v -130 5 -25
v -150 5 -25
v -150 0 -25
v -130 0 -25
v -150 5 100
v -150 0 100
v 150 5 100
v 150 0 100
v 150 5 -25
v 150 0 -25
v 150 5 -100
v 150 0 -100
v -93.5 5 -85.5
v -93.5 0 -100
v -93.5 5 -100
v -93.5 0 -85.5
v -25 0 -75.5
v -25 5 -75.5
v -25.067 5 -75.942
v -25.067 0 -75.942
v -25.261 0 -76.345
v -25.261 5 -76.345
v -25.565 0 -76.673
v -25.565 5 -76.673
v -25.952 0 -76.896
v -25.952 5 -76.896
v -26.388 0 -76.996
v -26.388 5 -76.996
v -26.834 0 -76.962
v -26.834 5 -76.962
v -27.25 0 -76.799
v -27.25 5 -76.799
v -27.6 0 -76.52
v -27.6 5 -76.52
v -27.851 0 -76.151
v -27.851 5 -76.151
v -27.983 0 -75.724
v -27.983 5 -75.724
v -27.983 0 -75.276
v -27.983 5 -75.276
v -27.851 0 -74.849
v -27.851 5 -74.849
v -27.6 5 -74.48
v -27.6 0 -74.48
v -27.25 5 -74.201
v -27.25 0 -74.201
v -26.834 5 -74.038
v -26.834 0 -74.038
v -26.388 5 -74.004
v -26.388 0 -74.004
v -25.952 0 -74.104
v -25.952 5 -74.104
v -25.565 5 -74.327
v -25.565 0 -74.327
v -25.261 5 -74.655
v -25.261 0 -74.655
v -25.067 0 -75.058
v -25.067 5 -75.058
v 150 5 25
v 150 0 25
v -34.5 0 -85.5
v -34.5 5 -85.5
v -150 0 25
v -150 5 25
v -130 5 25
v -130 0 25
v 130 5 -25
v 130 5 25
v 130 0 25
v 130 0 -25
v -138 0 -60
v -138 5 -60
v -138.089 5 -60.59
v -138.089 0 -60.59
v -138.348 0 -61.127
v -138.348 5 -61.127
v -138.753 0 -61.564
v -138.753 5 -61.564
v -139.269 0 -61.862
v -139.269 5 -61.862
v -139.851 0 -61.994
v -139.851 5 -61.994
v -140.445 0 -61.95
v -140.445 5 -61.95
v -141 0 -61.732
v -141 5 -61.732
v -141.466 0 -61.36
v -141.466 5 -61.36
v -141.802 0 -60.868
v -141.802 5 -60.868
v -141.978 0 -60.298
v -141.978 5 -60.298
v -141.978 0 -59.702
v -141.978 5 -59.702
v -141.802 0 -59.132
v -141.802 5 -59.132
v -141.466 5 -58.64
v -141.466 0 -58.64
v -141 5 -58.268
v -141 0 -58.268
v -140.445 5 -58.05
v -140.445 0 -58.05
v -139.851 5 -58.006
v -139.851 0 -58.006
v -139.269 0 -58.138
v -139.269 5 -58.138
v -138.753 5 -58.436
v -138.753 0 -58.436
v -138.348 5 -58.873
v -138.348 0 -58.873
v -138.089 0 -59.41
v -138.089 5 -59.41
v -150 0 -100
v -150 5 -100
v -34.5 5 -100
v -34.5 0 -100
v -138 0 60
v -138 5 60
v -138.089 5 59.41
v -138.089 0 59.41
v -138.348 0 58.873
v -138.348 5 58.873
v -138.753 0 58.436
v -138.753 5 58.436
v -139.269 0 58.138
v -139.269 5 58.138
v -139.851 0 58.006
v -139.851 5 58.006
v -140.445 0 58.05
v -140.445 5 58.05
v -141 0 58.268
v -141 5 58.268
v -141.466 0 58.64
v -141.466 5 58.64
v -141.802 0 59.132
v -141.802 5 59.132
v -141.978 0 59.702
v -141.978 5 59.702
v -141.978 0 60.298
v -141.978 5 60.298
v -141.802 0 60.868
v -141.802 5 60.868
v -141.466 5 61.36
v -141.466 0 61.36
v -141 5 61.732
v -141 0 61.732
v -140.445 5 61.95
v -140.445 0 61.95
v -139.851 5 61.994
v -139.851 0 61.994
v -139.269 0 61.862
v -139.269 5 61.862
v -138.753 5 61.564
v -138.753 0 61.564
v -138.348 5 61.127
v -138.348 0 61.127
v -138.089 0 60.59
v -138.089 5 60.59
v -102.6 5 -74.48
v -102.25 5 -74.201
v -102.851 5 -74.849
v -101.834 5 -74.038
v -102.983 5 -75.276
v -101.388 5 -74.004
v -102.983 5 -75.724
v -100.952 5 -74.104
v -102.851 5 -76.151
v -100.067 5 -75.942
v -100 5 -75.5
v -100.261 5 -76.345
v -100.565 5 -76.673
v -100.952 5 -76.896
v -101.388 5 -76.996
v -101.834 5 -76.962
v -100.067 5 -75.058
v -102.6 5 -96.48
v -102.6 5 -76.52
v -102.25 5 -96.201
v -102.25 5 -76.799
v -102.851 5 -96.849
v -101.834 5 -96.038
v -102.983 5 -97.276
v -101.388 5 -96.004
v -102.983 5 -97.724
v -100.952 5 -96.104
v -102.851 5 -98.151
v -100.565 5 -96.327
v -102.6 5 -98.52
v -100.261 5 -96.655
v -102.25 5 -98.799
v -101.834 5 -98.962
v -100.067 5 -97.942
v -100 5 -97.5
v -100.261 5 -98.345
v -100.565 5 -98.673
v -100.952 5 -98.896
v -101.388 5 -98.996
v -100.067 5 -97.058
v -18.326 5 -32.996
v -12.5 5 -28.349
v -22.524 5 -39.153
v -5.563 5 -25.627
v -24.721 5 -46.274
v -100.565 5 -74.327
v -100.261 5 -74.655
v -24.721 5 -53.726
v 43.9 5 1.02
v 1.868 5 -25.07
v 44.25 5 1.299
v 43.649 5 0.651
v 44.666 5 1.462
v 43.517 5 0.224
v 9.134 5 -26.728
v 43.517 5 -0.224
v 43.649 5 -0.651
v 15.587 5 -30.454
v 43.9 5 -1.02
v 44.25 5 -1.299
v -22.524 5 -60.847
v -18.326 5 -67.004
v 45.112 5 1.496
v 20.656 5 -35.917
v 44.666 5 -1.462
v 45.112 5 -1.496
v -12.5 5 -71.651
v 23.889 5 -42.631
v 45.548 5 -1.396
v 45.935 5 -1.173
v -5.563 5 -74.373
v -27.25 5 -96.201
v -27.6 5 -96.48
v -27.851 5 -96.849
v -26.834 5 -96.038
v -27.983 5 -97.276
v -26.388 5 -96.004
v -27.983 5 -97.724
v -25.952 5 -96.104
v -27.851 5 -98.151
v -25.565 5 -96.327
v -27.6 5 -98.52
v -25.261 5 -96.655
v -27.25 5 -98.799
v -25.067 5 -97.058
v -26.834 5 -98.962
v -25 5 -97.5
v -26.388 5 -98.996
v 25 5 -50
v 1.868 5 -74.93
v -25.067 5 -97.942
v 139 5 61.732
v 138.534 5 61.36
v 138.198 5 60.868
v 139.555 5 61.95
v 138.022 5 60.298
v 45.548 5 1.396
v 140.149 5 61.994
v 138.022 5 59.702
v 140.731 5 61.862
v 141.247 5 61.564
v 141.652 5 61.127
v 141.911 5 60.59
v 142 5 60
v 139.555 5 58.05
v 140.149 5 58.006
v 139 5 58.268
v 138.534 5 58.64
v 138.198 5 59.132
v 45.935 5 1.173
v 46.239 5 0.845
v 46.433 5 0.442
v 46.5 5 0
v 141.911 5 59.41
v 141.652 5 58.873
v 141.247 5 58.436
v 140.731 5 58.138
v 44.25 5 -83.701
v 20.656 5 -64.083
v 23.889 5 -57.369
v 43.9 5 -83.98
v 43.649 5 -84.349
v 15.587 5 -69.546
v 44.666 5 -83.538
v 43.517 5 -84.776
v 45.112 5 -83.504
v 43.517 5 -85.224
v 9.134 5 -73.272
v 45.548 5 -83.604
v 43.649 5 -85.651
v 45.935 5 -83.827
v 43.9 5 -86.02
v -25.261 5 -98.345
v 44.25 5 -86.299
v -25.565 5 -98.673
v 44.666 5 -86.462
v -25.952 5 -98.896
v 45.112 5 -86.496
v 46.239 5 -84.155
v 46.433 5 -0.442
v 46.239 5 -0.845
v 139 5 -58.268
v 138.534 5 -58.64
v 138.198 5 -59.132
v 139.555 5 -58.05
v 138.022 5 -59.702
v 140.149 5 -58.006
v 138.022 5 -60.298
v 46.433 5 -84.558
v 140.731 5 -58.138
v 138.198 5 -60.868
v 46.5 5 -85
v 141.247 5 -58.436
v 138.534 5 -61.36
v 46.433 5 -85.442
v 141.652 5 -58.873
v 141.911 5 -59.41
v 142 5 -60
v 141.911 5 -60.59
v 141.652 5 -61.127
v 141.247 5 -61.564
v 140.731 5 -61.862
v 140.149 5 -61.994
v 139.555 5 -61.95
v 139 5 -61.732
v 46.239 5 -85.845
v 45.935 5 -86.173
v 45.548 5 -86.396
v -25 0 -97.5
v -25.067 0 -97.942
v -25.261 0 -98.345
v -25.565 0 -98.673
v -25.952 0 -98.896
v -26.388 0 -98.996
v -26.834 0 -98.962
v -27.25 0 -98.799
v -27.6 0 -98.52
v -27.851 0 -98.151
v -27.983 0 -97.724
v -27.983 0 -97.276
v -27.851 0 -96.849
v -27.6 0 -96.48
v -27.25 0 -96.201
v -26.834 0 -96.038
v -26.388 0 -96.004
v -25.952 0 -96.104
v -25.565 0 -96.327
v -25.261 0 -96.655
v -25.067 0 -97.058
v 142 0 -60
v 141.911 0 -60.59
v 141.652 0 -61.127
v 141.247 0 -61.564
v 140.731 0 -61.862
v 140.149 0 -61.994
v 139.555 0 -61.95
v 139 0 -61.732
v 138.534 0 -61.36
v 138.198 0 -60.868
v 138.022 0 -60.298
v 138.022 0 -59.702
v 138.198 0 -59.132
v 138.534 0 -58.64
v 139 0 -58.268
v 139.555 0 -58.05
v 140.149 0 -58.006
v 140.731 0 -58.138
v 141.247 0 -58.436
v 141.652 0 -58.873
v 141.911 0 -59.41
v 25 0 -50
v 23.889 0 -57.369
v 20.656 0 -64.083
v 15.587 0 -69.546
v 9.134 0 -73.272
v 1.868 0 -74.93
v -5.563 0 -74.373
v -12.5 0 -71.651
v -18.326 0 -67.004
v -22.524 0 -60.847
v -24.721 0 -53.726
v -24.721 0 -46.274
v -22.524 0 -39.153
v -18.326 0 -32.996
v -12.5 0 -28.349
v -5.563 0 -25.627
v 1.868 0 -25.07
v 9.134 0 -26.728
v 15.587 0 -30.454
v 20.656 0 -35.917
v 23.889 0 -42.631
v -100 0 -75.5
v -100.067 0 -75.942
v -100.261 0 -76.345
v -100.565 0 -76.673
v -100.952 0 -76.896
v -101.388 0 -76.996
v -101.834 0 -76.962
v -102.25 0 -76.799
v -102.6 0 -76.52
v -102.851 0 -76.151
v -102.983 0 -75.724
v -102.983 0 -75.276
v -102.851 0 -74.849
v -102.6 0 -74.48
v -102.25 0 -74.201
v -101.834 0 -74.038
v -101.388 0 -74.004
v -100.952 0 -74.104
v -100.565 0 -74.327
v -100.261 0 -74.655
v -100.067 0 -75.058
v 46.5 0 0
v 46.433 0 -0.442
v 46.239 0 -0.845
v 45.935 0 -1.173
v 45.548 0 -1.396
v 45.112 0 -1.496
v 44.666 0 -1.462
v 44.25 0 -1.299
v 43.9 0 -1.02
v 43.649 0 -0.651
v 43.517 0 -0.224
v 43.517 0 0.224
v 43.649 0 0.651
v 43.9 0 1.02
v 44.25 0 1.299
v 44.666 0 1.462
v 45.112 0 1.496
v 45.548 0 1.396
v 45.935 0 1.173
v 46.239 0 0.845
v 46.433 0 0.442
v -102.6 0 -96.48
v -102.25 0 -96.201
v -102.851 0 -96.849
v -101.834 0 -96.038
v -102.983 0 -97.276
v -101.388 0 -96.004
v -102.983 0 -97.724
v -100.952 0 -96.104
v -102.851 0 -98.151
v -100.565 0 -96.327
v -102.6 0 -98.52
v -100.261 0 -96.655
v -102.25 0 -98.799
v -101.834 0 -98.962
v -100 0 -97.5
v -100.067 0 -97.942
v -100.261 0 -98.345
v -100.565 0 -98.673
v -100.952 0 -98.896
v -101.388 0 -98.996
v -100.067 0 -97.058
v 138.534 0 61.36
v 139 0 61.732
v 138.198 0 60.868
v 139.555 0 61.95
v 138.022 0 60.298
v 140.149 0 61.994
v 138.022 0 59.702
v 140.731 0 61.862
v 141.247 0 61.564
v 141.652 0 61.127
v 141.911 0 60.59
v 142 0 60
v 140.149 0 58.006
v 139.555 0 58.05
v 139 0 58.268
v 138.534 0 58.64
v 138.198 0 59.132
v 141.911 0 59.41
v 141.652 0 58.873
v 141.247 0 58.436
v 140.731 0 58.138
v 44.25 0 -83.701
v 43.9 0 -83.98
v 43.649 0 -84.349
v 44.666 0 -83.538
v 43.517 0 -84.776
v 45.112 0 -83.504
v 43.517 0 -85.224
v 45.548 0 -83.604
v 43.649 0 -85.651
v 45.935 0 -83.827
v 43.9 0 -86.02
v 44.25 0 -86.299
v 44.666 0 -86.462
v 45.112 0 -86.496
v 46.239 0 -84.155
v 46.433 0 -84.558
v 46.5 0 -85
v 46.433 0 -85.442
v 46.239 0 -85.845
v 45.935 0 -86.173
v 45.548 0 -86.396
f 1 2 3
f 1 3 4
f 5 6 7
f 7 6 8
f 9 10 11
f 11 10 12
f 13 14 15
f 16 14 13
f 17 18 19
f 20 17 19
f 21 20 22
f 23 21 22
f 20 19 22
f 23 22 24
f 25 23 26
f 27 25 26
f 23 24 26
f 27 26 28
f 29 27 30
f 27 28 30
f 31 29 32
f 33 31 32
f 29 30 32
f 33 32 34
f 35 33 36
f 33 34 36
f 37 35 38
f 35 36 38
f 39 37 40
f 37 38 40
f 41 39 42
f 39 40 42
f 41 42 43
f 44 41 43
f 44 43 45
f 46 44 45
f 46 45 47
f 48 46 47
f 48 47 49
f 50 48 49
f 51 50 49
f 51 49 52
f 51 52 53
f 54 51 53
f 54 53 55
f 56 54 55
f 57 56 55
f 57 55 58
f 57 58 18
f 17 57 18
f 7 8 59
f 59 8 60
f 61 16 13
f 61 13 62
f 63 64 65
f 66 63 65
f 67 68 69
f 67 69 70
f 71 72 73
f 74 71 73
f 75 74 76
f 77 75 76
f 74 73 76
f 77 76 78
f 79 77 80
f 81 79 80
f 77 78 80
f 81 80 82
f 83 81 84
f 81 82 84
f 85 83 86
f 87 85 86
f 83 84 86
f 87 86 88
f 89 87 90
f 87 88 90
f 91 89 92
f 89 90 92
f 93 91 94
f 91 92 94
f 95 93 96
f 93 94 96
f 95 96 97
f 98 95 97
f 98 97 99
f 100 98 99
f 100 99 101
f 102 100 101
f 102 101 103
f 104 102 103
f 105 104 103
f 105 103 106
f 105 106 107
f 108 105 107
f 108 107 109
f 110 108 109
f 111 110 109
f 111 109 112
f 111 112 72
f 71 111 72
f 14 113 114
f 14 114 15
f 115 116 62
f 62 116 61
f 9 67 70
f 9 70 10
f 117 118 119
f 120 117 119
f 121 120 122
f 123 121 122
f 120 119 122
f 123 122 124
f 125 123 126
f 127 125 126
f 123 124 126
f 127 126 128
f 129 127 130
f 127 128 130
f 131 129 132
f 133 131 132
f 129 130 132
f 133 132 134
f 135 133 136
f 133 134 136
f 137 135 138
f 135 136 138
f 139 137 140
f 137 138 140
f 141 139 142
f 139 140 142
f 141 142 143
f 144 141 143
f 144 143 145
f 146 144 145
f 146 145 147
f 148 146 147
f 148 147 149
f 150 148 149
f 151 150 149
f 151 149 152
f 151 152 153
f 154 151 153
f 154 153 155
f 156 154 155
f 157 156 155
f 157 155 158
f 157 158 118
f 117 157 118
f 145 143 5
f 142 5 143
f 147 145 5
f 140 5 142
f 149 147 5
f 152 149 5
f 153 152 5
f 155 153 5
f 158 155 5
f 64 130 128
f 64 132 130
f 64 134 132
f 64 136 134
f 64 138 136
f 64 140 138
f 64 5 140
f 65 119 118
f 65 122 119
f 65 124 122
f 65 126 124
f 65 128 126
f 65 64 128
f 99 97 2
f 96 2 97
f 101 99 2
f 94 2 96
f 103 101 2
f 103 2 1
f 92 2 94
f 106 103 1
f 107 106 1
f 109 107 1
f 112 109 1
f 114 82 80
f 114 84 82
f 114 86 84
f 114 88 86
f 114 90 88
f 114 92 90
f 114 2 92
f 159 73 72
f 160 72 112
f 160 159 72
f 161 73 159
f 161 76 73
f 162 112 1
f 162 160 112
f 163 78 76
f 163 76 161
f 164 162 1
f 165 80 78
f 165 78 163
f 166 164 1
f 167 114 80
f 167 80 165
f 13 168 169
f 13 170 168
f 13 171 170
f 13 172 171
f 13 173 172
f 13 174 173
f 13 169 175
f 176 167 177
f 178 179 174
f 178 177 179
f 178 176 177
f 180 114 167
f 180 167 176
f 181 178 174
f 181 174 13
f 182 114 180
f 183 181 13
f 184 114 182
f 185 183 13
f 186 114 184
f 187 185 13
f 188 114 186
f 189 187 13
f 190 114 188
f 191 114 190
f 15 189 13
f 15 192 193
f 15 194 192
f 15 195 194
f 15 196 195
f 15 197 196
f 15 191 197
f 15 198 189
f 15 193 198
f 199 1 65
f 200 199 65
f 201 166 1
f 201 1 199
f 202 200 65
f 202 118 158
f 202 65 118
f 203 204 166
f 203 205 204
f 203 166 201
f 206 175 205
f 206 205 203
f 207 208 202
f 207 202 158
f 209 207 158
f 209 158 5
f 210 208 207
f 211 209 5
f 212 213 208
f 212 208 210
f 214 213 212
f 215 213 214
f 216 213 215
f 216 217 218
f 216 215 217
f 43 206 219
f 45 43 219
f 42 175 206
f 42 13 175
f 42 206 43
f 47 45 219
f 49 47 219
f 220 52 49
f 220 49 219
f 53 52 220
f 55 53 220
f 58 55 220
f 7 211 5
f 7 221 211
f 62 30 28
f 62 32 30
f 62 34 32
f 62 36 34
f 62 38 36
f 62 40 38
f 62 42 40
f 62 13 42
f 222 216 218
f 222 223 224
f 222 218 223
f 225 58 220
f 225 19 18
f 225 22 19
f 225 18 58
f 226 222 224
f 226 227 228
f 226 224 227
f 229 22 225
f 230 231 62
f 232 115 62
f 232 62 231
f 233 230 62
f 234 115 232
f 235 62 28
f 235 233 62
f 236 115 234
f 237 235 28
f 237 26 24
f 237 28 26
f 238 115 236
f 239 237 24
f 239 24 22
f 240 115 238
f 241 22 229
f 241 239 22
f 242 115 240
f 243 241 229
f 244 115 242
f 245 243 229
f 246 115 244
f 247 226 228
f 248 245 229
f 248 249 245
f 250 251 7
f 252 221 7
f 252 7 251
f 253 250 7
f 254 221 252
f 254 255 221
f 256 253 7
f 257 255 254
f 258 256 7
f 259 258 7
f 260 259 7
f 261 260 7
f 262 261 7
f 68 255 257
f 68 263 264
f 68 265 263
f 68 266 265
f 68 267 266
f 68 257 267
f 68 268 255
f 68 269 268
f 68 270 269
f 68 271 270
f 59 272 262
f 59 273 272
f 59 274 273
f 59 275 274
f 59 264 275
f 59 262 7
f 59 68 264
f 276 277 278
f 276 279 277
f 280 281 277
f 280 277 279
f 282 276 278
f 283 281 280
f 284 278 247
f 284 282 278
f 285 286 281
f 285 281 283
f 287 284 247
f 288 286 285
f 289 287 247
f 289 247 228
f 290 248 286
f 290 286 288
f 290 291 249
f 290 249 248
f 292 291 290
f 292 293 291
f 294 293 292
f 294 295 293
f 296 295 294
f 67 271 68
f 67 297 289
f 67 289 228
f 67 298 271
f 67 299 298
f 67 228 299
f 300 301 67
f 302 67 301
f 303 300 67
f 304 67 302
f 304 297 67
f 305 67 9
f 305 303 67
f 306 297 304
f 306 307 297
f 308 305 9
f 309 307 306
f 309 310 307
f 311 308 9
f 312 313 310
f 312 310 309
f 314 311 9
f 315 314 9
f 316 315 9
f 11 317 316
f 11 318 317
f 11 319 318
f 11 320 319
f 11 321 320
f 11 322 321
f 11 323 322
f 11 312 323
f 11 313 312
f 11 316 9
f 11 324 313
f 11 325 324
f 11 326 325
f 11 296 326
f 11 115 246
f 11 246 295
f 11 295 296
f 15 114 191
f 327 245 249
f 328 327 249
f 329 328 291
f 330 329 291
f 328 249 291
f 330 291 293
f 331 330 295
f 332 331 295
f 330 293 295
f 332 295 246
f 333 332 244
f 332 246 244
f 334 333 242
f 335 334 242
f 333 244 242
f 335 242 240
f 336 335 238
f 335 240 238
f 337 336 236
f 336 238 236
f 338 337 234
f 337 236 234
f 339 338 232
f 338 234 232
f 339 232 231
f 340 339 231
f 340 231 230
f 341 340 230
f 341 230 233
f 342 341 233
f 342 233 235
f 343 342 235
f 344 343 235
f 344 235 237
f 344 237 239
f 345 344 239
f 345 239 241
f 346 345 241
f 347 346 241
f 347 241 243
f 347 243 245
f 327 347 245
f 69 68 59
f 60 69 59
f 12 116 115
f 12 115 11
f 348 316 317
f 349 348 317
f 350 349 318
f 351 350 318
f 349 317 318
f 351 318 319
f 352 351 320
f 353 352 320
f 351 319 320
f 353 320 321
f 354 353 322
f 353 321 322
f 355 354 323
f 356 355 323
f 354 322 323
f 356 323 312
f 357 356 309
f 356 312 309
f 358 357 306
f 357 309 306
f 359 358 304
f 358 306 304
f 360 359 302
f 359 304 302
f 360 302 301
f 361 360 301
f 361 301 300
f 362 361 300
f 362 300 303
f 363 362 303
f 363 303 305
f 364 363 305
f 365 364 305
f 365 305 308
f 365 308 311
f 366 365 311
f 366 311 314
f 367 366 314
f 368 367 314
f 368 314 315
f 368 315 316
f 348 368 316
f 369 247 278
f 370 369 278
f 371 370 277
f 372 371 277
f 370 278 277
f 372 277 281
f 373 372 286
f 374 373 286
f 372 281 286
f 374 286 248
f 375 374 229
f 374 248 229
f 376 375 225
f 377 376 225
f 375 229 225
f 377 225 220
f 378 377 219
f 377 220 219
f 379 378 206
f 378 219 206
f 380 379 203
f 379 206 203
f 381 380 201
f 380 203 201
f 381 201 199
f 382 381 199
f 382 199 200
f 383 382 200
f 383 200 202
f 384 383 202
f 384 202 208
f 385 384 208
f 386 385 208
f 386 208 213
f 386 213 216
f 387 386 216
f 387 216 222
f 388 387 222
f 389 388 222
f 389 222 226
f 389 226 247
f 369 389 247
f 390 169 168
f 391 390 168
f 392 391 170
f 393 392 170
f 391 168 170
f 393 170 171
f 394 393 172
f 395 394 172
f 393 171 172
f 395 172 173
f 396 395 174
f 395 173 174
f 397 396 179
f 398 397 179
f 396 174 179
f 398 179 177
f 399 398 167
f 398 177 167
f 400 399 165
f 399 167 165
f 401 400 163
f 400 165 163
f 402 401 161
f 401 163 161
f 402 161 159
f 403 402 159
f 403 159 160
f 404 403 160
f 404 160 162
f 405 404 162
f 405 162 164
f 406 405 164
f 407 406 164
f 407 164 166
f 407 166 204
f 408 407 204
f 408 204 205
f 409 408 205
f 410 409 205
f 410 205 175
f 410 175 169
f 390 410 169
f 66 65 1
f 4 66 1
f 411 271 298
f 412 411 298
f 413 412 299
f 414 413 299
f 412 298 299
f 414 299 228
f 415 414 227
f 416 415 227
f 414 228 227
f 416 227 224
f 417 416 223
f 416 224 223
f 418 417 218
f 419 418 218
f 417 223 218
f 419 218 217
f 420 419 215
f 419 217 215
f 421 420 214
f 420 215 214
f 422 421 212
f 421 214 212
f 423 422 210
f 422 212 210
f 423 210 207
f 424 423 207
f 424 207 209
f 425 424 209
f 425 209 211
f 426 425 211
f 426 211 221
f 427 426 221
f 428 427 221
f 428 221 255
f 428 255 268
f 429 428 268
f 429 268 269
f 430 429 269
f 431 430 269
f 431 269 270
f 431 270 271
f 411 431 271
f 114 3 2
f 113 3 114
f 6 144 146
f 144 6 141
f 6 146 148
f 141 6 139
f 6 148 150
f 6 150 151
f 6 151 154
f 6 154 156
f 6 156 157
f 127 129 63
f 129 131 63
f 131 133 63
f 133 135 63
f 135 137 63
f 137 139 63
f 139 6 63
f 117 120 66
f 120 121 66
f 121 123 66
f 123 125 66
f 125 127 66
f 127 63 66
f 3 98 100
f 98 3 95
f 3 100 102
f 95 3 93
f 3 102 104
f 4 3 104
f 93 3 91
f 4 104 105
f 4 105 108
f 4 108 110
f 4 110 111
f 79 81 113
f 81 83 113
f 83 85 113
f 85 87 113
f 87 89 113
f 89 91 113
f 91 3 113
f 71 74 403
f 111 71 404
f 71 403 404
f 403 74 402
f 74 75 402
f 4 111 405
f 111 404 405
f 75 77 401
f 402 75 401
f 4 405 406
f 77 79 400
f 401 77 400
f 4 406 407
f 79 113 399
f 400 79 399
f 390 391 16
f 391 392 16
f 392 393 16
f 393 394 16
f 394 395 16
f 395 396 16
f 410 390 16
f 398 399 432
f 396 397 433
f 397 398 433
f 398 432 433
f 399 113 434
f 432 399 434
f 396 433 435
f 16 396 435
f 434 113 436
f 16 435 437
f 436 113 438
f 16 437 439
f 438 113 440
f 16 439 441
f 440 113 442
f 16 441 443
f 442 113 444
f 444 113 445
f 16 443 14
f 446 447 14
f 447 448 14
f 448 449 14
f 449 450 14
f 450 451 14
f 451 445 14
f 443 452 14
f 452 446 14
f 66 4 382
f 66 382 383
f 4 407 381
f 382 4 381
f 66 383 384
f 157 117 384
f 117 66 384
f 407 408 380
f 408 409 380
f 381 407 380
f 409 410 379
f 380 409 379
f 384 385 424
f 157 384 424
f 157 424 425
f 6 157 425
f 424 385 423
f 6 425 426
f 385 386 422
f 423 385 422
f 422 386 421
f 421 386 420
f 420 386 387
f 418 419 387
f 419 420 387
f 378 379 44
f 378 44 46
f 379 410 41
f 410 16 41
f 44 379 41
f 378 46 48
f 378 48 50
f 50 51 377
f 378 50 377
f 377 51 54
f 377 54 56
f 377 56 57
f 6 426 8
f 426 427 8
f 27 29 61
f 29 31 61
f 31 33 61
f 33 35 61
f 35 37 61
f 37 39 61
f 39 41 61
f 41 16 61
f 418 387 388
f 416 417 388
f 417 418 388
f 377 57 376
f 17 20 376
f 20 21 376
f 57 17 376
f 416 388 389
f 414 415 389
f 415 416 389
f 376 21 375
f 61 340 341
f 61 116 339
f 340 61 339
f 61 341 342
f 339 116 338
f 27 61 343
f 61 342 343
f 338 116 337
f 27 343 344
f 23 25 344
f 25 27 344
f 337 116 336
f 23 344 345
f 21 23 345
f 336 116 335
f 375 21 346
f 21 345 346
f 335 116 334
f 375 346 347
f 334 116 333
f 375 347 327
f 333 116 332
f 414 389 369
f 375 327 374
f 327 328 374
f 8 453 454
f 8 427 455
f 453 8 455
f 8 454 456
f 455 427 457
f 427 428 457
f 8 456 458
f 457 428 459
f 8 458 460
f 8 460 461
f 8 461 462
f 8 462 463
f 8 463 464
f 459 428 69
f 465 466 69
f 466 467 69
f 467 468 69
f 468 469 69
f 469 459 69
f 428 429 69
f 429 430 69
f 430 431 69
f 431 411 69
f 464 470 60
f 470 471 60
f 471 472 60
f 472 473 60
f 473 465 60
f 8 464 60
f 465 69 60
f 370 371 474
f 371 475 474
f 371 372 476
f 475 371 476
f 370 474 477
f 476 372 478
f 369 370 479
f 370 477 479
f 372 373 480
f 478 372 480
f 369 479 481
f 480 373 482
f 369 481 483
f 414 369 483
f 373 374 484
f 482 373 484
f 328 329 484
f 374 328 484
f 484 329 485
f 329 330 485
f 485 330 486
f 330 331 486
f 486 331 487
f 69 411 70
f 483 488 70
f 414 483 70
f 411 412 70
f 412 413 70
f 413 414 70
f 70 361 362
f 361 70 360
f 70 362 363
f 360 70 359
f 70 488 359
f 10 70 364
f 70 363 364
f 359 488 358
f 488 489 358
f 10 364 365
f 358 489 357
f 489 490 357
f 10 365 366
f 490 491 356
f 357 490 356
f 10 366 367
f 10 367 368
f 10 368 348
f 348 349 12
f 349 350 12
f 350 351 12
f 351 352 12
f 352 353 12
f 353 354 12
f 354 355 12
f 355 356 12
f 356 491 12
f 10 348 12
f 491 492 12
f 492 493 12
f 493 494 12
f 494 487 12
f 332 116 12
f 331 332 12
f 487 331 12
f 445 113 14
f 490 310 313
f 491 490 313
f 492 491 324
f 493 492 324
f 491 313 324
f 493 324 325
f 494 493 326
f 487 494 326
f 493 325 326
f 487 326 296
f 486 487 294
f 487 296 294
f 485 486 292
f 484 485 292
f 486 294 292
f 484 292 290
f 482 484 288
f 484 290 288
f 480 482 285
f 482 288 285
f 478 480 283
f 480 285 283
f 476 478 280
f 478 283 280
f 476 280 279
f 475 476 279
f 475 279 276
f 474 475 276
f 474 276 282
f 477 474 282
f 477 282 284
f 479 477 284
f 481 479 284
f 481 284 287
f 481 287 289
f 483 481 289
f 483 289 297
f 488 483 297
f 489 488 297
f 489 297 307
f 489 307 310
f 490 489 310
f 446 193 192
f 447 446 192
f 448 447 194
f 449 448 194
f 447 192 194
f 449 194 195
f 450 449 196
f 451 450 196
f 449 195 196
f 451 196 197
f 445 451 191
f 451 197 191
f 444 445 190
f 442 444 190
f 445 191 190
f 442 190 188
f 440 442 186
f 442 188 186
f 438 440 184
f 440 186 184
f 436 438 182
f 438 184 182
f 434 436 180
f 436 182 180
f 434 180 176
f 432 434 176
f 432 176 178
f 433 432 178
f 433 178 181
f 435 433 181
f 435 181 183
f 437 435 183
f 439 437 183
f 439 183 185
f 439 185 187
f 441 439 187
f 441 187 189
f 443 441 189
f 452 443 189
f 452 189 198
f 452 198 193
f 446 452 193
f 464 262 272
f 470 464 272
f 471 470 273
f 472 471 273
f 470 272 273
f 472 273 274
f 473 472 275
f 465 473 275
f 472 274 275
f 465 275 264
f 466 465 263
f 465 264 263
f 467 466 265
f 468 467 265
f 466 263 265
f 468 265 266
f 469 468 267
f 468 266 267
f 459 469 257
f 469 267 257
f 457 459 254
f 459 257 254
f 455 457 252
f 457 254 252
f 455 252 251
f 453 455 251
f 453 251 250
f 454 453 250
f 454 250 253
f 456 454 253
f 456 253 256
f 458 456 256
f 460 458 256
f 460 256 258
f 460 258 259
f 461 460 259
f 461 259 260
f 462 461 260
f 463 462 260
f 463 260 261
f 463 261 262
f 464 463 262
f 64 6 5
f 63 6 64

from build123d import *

# Parameters (mm, degrees)
SKETCH1_W           = 300
SKETCH1_H           = 200
BOSS_EXTRUDE1_DEPTH = 5
SKETCH2_R           = 2
SKETCH2_R_2         = 25
CUT_EXTRUDE2_DEPTH  = 6
SKETCH4_R           = 1.5
CUT_EXTRUDE3_DEPTH  = 6
SKETCH6_W           = 59
SKETCH6_H           = 14.5
CUT_EXTRUDE4_DEPTH  = 5
SKETCH8_R           = 1.5
CUT_EXTRUDE6_DEPTH  = 6
SKETCH9_W           = 20
SKETCH9_H           = 50
CUT_EXTRUDE7_DEPTH  = 6


with BuildPart() as part:
    # Sketch1 → Boss-Extrude1 (new body)
    with BuildSketch(Plane(origin=(0, 0, 0), x_dir=(1, 0, 0), z_dir=(0, 1, 0))):
        Rectangle(SKETCH1_W, SKETCH1_H)
    extrude(amount=BOSS_EXTRUDE1_DEPTH)

    # Sketch2 → Cut-Extrude2 (cut, through all)
    with BuildSketch(Plane(origin=(0, 5, 0), x_dir=(1, 0, 0), z_dir=(0, 1, 0))):
        with Locations((-140, 0)):
            Circle(SKETCH2_R)
        with Locations((-140, 60)):
            Circle(SKETCH2_R)
        with Locations((-140, -60)):
            Circle(SKETCH2_R)
        with Locations((140, -60)):
            Circle(SKETCH2_R)
        with Locations((140, 60)):
            Circle(SKETCH2_R)
        with Locations((140, 0)):
            Circle(SKETCH2_R)
        with Locations((0, 50)):
            Circle(SKETCH2_R_2)
    extrude(amount=-CUT_EXTRUDE2_DEPTH, mode=Mode.SUBTRACT)

    # Sketch4 → Cut-Extrude3 (cut, through all)
    with BuildSketch(Plane(origin=(0, 5, 0), x_dir=(1, 0, 0), z_dir=(0, 1, 0))):
        with Locations((-101.5, 97.5)):
            Circle(SKETCH4_R)
        with Locations((-26.5, 97.5)):
            Circle(SKETCH4_R)
        with Locations((-26.5, 75.5)):
            Circle(SKETCH4_R)
        with Locations((-101.5, 75.5)):
            Circle(SKETCH4_R)
    extrude(amount=-CUT_EXTRUDE3_DEPTH, mode=Mode.SUBTRACT)

    # Sketch6 → Cut-Extrude4 (cut)
    with BuildSketch(Plane.XZ):
        with Locations((-64, -92.75)):
            Rectangle(SKETCH6_W, SKETCH6_H)
    extrude(amount=-CUT_EXTRUDE4_DEPTH, mode=Mode.SUBTRACT)

    # Sketch8 → Cut-Extrude6 (cut, through all)
    with BuildSketch(Plane(origin=(0, 5, 0), x_dir=(1, 0, 0), z_dir=(0, 1, 0))):
        with Locations((45, 85)):
            Circle(SKETCH8_R)
        with Locations((45, 0)):
            Circle(SKETCH8_R)
    extrude(amount=-CUT_EXTRUDE6_DEPTH, mode=Mode.SUBTRACT)

    # Sketch9 → Cut-Extrude7 (cut, through all)
    with BuildSketch(Plane(origin=(0, 5, 0), x_dir=(1, 0, 0), z_dir=(0, 1, 0))):
        with Locations((-140, 0)):
            Rectangle(SKETCH9_W, SKETCH9_H)
        with Locations((140, 0)):
            Rectangle(SKETCH9_W, SKETCH9_H)
    extrude(amount=-CUT_EXTRUDE7_DEPTH, mode=Mode.SUBTRACT)


solid = part.part
